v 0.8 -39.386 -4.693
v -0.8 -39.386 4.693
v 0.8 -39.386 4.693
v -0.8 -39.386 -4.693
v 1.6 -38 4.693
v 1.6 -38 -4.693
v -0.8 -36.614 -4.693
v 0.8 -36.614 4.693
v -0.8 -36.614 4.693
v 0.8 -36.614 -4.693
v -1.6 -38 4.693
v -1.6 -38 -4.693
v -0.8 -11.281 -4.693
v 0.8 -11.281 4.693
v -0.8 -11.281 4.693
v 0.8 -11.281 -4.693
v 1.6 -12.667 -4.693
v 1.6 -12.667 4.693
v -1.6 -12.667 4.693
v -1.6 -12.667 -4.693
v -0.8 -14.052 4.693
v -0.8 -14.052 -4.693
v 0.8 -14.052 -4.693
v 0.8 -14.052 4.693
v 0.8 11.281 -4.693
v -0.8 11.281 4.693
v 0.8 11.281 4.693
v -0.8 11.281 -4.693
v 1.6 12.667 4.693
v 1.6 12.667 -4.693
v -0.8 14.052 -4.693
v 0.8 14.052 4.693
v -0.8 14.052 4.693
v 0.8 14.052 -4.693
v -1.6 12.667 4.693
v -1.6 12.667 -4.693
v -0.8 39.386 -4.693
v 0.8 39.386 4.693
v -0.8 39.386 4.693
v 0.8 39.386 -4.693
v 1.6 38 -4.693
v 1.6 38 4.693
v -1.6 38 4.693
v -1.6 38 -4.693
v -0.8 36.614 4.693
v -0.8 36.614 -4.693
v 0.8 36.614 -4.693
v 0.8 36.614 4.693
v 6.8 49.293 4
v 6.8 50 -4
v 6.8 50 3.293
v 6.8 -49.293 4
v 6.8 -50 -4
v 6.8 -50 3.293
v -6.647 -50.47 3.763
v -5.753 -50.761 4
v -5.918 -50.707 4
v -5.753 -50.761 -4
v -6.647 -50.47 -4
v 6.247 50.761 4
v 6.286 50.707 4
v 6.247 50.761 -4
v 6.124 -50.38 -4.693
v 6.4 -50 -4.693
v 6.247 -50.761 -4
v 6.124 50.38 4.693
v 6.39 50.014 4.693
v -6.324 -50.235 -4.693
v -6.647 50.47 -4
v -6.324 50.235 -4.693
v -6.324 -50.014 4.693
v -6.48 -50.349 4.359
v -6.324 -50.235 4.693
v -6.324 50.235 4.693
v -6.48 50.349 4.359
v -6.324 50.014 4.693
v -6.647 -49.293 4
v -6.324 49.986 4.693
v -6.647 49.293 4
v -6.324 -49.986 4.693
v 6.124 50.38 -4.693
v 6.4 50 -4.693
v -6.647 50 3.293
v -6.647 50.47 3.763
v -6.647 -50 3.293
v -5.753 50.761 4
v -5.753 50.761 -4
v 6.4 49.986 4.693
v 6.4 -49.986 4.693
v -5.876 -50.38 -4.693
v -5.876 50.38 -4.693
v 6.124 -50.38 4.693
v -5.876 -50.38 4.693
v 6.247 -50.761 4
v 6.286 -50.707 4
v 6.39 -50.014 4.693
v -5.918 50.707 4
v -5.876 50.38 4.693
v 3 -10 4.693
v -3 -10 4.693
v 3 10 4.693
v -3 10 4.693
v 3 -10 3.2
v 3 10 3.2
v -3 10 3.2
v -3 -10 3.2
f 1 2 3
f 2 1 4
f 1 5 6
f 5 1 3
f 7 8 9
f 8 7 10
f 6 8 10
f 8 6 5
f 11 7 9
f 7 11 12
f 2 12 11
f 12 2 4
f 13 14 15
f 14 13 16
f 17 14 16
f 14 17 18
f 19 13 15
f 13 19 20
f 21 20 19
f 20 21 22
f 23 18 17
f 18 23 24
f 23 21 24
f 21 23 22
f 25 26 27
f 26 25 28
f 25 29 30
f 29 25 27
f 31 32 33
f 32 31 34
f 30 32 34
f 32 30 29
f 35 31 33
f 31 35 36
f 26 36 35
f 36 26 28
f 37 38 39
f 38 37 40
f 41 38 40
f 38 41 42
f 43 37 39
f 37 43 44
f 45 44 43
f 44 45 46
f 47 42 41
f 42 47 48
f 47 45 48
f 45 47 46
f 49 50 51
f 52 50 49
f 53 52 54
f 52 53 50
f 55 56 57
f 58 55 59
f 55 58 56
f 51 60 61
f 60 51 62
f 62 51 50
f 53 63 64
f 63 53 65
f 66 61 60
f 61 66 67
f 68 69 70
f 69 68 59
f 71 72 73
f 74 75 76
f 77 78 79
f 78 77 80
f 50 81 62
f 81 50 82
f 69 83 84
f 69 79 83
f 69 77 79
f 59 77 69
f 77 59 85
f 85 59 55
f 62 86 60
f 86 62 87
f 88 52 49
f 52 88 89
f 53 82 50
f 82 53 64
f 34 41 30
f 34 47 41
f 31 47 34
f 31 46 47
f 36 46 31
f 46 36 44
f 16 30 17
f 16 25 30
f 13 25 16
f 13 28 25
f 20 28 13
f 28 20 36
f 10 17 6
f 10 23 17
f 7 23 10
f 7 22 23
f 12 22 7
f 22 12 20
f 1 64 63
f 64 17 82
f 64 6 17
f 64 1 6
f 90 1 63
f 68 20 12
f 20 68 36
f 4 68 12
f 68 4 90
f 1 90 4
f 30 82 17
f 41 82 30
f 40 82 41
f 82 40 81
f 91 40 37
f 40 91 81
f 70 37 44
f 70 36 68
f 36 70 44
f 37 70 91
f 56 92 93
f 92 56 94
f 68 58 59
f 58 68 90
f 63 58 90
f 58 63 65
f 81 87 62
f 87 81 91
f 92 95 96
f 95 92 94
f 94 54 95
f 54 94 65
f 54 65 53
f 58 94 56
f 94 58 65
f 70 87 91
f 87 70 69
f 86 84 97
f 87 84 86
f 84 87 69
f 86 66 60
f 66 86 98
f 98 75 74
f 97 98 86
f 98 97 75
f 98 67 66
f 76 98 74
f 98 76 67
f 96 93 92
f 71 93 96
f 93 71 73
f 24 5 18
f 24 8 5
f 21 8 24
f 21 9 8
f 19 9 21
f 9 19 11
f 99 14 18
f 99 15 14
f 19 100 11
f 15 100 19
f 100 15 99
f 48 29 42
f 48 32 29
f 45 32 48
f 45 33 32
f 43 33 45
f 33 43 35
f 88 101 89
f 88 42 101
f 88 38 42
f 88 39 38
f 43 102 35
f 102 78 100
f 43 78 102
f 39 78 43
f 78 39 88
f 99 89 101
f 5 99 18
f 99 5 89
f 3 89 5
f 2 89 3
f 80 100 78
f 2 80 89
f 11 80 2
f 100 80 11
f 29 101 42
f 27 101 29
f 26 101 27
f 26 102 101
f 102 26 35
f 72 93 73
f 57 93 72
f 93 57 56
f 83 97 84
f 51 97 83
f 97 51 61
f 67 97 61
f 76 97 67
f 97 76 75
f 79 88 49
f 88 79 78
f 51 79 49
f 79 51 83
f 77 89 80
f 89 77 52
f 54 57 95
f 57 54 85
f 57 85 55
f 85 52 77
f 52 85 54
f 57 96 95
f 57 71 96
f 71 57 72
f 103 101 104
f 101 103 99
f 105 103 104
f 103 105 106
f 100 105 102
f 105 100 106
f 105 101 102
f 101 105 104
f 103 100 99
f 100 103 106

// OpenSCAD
// Parameters
rail_length = 100.0; //[50.0:200.0:1]
rail_width = 12.0; //[6.0:24.0:0.5]
rail_height = 8.0; //[4.0:16.0:0.5]
hole_diameter = 3.2; //[2.0:6.0:0.1]
hole_count = 4; //[2:8:1]
end_margin = 12.0; //[6.0:24.0:0.5]
chamfer_size = 1.0; //[0.5:3.0:0.1]
fillet_radius = 0.8; //[0.3:2.0:0.1]
engrave_depth = 0.3; //[0.1:1.0:0.1]
engrave_width = 6.0; //[3.0:10.0:0.5]
engrave_length = 20.0; //[10.0:40.0:1]
overlap = 1.0; //[0.5:2.0:0.1]

// Base Shapes
module rail_body() {
  cube([rail_width, rail_length, rail_height], center=true);
}

module mounting_holes() {
  cylinder(h=rail_height + 2*overlap, r=hole_diameter/2, center=true);
}

module end_chamfer_wedge() {
  cube([rail_width + 2*overlap, chamfer_size, chamfer_size], center=true);
}

module edge_fillet_sphere() {
  sphere(r=fillet_radius);
}

module engraved_markings() {
  cube([engrave_width, engrave_length, engrave_depth + 2*overlap], center=true);
}

// Operations
module edge_fillets() {
  minkowski() {
    rail_body();
    edge_fillet_sphere();
  }
}

module holes_all() {
  union() {
    translate([0, -rail_length/2 + end_margin, 0]) mounting_holes();
    translate([0, -rail_length/2 + end_margin + (rail_length - 2*end_margin)/3, 0]) mounting_holes();
    translate([0, -rail_length/2 + end_margin + 2*(rail_length - 2*end_margin)/3, 0]) mounting_holes();
    translate([0, rail_length/2 - end_margin, 0]) mounting_holes();
  }
}

module end_chamfers() {
  union() {
    translate([0, rail_length/2 - chamfer_size/2 + overlap/2, rail_height/2 - chamfer_size/2 + overlap/2])
      rotate([45, 0, 0]) end_chamfer_wedge();
    translate([0, -rail_length/2 + chamfer_size/2 - overlap/2, rail_height/2 - chamfer_size/2 + overlap/2])
      rotate([-45, 0, 0]) end_chamfer_wedge();
  }
}

module engrave_pos() {
  translate([0, 0, rail_height/2 - engrave_depth/2 + overlap/2]) engraved_markings();
}

// Final Rail
module rail_complete() {
  difference() {
    difference() {
      difference() {
        edge_fillets();
        holes_all();
      }
      end_chamfers();
    }
    engrave_pos();
  }
}

// Render the final rail
color([0.75, 0.75, 0.77]) rail_complete();
